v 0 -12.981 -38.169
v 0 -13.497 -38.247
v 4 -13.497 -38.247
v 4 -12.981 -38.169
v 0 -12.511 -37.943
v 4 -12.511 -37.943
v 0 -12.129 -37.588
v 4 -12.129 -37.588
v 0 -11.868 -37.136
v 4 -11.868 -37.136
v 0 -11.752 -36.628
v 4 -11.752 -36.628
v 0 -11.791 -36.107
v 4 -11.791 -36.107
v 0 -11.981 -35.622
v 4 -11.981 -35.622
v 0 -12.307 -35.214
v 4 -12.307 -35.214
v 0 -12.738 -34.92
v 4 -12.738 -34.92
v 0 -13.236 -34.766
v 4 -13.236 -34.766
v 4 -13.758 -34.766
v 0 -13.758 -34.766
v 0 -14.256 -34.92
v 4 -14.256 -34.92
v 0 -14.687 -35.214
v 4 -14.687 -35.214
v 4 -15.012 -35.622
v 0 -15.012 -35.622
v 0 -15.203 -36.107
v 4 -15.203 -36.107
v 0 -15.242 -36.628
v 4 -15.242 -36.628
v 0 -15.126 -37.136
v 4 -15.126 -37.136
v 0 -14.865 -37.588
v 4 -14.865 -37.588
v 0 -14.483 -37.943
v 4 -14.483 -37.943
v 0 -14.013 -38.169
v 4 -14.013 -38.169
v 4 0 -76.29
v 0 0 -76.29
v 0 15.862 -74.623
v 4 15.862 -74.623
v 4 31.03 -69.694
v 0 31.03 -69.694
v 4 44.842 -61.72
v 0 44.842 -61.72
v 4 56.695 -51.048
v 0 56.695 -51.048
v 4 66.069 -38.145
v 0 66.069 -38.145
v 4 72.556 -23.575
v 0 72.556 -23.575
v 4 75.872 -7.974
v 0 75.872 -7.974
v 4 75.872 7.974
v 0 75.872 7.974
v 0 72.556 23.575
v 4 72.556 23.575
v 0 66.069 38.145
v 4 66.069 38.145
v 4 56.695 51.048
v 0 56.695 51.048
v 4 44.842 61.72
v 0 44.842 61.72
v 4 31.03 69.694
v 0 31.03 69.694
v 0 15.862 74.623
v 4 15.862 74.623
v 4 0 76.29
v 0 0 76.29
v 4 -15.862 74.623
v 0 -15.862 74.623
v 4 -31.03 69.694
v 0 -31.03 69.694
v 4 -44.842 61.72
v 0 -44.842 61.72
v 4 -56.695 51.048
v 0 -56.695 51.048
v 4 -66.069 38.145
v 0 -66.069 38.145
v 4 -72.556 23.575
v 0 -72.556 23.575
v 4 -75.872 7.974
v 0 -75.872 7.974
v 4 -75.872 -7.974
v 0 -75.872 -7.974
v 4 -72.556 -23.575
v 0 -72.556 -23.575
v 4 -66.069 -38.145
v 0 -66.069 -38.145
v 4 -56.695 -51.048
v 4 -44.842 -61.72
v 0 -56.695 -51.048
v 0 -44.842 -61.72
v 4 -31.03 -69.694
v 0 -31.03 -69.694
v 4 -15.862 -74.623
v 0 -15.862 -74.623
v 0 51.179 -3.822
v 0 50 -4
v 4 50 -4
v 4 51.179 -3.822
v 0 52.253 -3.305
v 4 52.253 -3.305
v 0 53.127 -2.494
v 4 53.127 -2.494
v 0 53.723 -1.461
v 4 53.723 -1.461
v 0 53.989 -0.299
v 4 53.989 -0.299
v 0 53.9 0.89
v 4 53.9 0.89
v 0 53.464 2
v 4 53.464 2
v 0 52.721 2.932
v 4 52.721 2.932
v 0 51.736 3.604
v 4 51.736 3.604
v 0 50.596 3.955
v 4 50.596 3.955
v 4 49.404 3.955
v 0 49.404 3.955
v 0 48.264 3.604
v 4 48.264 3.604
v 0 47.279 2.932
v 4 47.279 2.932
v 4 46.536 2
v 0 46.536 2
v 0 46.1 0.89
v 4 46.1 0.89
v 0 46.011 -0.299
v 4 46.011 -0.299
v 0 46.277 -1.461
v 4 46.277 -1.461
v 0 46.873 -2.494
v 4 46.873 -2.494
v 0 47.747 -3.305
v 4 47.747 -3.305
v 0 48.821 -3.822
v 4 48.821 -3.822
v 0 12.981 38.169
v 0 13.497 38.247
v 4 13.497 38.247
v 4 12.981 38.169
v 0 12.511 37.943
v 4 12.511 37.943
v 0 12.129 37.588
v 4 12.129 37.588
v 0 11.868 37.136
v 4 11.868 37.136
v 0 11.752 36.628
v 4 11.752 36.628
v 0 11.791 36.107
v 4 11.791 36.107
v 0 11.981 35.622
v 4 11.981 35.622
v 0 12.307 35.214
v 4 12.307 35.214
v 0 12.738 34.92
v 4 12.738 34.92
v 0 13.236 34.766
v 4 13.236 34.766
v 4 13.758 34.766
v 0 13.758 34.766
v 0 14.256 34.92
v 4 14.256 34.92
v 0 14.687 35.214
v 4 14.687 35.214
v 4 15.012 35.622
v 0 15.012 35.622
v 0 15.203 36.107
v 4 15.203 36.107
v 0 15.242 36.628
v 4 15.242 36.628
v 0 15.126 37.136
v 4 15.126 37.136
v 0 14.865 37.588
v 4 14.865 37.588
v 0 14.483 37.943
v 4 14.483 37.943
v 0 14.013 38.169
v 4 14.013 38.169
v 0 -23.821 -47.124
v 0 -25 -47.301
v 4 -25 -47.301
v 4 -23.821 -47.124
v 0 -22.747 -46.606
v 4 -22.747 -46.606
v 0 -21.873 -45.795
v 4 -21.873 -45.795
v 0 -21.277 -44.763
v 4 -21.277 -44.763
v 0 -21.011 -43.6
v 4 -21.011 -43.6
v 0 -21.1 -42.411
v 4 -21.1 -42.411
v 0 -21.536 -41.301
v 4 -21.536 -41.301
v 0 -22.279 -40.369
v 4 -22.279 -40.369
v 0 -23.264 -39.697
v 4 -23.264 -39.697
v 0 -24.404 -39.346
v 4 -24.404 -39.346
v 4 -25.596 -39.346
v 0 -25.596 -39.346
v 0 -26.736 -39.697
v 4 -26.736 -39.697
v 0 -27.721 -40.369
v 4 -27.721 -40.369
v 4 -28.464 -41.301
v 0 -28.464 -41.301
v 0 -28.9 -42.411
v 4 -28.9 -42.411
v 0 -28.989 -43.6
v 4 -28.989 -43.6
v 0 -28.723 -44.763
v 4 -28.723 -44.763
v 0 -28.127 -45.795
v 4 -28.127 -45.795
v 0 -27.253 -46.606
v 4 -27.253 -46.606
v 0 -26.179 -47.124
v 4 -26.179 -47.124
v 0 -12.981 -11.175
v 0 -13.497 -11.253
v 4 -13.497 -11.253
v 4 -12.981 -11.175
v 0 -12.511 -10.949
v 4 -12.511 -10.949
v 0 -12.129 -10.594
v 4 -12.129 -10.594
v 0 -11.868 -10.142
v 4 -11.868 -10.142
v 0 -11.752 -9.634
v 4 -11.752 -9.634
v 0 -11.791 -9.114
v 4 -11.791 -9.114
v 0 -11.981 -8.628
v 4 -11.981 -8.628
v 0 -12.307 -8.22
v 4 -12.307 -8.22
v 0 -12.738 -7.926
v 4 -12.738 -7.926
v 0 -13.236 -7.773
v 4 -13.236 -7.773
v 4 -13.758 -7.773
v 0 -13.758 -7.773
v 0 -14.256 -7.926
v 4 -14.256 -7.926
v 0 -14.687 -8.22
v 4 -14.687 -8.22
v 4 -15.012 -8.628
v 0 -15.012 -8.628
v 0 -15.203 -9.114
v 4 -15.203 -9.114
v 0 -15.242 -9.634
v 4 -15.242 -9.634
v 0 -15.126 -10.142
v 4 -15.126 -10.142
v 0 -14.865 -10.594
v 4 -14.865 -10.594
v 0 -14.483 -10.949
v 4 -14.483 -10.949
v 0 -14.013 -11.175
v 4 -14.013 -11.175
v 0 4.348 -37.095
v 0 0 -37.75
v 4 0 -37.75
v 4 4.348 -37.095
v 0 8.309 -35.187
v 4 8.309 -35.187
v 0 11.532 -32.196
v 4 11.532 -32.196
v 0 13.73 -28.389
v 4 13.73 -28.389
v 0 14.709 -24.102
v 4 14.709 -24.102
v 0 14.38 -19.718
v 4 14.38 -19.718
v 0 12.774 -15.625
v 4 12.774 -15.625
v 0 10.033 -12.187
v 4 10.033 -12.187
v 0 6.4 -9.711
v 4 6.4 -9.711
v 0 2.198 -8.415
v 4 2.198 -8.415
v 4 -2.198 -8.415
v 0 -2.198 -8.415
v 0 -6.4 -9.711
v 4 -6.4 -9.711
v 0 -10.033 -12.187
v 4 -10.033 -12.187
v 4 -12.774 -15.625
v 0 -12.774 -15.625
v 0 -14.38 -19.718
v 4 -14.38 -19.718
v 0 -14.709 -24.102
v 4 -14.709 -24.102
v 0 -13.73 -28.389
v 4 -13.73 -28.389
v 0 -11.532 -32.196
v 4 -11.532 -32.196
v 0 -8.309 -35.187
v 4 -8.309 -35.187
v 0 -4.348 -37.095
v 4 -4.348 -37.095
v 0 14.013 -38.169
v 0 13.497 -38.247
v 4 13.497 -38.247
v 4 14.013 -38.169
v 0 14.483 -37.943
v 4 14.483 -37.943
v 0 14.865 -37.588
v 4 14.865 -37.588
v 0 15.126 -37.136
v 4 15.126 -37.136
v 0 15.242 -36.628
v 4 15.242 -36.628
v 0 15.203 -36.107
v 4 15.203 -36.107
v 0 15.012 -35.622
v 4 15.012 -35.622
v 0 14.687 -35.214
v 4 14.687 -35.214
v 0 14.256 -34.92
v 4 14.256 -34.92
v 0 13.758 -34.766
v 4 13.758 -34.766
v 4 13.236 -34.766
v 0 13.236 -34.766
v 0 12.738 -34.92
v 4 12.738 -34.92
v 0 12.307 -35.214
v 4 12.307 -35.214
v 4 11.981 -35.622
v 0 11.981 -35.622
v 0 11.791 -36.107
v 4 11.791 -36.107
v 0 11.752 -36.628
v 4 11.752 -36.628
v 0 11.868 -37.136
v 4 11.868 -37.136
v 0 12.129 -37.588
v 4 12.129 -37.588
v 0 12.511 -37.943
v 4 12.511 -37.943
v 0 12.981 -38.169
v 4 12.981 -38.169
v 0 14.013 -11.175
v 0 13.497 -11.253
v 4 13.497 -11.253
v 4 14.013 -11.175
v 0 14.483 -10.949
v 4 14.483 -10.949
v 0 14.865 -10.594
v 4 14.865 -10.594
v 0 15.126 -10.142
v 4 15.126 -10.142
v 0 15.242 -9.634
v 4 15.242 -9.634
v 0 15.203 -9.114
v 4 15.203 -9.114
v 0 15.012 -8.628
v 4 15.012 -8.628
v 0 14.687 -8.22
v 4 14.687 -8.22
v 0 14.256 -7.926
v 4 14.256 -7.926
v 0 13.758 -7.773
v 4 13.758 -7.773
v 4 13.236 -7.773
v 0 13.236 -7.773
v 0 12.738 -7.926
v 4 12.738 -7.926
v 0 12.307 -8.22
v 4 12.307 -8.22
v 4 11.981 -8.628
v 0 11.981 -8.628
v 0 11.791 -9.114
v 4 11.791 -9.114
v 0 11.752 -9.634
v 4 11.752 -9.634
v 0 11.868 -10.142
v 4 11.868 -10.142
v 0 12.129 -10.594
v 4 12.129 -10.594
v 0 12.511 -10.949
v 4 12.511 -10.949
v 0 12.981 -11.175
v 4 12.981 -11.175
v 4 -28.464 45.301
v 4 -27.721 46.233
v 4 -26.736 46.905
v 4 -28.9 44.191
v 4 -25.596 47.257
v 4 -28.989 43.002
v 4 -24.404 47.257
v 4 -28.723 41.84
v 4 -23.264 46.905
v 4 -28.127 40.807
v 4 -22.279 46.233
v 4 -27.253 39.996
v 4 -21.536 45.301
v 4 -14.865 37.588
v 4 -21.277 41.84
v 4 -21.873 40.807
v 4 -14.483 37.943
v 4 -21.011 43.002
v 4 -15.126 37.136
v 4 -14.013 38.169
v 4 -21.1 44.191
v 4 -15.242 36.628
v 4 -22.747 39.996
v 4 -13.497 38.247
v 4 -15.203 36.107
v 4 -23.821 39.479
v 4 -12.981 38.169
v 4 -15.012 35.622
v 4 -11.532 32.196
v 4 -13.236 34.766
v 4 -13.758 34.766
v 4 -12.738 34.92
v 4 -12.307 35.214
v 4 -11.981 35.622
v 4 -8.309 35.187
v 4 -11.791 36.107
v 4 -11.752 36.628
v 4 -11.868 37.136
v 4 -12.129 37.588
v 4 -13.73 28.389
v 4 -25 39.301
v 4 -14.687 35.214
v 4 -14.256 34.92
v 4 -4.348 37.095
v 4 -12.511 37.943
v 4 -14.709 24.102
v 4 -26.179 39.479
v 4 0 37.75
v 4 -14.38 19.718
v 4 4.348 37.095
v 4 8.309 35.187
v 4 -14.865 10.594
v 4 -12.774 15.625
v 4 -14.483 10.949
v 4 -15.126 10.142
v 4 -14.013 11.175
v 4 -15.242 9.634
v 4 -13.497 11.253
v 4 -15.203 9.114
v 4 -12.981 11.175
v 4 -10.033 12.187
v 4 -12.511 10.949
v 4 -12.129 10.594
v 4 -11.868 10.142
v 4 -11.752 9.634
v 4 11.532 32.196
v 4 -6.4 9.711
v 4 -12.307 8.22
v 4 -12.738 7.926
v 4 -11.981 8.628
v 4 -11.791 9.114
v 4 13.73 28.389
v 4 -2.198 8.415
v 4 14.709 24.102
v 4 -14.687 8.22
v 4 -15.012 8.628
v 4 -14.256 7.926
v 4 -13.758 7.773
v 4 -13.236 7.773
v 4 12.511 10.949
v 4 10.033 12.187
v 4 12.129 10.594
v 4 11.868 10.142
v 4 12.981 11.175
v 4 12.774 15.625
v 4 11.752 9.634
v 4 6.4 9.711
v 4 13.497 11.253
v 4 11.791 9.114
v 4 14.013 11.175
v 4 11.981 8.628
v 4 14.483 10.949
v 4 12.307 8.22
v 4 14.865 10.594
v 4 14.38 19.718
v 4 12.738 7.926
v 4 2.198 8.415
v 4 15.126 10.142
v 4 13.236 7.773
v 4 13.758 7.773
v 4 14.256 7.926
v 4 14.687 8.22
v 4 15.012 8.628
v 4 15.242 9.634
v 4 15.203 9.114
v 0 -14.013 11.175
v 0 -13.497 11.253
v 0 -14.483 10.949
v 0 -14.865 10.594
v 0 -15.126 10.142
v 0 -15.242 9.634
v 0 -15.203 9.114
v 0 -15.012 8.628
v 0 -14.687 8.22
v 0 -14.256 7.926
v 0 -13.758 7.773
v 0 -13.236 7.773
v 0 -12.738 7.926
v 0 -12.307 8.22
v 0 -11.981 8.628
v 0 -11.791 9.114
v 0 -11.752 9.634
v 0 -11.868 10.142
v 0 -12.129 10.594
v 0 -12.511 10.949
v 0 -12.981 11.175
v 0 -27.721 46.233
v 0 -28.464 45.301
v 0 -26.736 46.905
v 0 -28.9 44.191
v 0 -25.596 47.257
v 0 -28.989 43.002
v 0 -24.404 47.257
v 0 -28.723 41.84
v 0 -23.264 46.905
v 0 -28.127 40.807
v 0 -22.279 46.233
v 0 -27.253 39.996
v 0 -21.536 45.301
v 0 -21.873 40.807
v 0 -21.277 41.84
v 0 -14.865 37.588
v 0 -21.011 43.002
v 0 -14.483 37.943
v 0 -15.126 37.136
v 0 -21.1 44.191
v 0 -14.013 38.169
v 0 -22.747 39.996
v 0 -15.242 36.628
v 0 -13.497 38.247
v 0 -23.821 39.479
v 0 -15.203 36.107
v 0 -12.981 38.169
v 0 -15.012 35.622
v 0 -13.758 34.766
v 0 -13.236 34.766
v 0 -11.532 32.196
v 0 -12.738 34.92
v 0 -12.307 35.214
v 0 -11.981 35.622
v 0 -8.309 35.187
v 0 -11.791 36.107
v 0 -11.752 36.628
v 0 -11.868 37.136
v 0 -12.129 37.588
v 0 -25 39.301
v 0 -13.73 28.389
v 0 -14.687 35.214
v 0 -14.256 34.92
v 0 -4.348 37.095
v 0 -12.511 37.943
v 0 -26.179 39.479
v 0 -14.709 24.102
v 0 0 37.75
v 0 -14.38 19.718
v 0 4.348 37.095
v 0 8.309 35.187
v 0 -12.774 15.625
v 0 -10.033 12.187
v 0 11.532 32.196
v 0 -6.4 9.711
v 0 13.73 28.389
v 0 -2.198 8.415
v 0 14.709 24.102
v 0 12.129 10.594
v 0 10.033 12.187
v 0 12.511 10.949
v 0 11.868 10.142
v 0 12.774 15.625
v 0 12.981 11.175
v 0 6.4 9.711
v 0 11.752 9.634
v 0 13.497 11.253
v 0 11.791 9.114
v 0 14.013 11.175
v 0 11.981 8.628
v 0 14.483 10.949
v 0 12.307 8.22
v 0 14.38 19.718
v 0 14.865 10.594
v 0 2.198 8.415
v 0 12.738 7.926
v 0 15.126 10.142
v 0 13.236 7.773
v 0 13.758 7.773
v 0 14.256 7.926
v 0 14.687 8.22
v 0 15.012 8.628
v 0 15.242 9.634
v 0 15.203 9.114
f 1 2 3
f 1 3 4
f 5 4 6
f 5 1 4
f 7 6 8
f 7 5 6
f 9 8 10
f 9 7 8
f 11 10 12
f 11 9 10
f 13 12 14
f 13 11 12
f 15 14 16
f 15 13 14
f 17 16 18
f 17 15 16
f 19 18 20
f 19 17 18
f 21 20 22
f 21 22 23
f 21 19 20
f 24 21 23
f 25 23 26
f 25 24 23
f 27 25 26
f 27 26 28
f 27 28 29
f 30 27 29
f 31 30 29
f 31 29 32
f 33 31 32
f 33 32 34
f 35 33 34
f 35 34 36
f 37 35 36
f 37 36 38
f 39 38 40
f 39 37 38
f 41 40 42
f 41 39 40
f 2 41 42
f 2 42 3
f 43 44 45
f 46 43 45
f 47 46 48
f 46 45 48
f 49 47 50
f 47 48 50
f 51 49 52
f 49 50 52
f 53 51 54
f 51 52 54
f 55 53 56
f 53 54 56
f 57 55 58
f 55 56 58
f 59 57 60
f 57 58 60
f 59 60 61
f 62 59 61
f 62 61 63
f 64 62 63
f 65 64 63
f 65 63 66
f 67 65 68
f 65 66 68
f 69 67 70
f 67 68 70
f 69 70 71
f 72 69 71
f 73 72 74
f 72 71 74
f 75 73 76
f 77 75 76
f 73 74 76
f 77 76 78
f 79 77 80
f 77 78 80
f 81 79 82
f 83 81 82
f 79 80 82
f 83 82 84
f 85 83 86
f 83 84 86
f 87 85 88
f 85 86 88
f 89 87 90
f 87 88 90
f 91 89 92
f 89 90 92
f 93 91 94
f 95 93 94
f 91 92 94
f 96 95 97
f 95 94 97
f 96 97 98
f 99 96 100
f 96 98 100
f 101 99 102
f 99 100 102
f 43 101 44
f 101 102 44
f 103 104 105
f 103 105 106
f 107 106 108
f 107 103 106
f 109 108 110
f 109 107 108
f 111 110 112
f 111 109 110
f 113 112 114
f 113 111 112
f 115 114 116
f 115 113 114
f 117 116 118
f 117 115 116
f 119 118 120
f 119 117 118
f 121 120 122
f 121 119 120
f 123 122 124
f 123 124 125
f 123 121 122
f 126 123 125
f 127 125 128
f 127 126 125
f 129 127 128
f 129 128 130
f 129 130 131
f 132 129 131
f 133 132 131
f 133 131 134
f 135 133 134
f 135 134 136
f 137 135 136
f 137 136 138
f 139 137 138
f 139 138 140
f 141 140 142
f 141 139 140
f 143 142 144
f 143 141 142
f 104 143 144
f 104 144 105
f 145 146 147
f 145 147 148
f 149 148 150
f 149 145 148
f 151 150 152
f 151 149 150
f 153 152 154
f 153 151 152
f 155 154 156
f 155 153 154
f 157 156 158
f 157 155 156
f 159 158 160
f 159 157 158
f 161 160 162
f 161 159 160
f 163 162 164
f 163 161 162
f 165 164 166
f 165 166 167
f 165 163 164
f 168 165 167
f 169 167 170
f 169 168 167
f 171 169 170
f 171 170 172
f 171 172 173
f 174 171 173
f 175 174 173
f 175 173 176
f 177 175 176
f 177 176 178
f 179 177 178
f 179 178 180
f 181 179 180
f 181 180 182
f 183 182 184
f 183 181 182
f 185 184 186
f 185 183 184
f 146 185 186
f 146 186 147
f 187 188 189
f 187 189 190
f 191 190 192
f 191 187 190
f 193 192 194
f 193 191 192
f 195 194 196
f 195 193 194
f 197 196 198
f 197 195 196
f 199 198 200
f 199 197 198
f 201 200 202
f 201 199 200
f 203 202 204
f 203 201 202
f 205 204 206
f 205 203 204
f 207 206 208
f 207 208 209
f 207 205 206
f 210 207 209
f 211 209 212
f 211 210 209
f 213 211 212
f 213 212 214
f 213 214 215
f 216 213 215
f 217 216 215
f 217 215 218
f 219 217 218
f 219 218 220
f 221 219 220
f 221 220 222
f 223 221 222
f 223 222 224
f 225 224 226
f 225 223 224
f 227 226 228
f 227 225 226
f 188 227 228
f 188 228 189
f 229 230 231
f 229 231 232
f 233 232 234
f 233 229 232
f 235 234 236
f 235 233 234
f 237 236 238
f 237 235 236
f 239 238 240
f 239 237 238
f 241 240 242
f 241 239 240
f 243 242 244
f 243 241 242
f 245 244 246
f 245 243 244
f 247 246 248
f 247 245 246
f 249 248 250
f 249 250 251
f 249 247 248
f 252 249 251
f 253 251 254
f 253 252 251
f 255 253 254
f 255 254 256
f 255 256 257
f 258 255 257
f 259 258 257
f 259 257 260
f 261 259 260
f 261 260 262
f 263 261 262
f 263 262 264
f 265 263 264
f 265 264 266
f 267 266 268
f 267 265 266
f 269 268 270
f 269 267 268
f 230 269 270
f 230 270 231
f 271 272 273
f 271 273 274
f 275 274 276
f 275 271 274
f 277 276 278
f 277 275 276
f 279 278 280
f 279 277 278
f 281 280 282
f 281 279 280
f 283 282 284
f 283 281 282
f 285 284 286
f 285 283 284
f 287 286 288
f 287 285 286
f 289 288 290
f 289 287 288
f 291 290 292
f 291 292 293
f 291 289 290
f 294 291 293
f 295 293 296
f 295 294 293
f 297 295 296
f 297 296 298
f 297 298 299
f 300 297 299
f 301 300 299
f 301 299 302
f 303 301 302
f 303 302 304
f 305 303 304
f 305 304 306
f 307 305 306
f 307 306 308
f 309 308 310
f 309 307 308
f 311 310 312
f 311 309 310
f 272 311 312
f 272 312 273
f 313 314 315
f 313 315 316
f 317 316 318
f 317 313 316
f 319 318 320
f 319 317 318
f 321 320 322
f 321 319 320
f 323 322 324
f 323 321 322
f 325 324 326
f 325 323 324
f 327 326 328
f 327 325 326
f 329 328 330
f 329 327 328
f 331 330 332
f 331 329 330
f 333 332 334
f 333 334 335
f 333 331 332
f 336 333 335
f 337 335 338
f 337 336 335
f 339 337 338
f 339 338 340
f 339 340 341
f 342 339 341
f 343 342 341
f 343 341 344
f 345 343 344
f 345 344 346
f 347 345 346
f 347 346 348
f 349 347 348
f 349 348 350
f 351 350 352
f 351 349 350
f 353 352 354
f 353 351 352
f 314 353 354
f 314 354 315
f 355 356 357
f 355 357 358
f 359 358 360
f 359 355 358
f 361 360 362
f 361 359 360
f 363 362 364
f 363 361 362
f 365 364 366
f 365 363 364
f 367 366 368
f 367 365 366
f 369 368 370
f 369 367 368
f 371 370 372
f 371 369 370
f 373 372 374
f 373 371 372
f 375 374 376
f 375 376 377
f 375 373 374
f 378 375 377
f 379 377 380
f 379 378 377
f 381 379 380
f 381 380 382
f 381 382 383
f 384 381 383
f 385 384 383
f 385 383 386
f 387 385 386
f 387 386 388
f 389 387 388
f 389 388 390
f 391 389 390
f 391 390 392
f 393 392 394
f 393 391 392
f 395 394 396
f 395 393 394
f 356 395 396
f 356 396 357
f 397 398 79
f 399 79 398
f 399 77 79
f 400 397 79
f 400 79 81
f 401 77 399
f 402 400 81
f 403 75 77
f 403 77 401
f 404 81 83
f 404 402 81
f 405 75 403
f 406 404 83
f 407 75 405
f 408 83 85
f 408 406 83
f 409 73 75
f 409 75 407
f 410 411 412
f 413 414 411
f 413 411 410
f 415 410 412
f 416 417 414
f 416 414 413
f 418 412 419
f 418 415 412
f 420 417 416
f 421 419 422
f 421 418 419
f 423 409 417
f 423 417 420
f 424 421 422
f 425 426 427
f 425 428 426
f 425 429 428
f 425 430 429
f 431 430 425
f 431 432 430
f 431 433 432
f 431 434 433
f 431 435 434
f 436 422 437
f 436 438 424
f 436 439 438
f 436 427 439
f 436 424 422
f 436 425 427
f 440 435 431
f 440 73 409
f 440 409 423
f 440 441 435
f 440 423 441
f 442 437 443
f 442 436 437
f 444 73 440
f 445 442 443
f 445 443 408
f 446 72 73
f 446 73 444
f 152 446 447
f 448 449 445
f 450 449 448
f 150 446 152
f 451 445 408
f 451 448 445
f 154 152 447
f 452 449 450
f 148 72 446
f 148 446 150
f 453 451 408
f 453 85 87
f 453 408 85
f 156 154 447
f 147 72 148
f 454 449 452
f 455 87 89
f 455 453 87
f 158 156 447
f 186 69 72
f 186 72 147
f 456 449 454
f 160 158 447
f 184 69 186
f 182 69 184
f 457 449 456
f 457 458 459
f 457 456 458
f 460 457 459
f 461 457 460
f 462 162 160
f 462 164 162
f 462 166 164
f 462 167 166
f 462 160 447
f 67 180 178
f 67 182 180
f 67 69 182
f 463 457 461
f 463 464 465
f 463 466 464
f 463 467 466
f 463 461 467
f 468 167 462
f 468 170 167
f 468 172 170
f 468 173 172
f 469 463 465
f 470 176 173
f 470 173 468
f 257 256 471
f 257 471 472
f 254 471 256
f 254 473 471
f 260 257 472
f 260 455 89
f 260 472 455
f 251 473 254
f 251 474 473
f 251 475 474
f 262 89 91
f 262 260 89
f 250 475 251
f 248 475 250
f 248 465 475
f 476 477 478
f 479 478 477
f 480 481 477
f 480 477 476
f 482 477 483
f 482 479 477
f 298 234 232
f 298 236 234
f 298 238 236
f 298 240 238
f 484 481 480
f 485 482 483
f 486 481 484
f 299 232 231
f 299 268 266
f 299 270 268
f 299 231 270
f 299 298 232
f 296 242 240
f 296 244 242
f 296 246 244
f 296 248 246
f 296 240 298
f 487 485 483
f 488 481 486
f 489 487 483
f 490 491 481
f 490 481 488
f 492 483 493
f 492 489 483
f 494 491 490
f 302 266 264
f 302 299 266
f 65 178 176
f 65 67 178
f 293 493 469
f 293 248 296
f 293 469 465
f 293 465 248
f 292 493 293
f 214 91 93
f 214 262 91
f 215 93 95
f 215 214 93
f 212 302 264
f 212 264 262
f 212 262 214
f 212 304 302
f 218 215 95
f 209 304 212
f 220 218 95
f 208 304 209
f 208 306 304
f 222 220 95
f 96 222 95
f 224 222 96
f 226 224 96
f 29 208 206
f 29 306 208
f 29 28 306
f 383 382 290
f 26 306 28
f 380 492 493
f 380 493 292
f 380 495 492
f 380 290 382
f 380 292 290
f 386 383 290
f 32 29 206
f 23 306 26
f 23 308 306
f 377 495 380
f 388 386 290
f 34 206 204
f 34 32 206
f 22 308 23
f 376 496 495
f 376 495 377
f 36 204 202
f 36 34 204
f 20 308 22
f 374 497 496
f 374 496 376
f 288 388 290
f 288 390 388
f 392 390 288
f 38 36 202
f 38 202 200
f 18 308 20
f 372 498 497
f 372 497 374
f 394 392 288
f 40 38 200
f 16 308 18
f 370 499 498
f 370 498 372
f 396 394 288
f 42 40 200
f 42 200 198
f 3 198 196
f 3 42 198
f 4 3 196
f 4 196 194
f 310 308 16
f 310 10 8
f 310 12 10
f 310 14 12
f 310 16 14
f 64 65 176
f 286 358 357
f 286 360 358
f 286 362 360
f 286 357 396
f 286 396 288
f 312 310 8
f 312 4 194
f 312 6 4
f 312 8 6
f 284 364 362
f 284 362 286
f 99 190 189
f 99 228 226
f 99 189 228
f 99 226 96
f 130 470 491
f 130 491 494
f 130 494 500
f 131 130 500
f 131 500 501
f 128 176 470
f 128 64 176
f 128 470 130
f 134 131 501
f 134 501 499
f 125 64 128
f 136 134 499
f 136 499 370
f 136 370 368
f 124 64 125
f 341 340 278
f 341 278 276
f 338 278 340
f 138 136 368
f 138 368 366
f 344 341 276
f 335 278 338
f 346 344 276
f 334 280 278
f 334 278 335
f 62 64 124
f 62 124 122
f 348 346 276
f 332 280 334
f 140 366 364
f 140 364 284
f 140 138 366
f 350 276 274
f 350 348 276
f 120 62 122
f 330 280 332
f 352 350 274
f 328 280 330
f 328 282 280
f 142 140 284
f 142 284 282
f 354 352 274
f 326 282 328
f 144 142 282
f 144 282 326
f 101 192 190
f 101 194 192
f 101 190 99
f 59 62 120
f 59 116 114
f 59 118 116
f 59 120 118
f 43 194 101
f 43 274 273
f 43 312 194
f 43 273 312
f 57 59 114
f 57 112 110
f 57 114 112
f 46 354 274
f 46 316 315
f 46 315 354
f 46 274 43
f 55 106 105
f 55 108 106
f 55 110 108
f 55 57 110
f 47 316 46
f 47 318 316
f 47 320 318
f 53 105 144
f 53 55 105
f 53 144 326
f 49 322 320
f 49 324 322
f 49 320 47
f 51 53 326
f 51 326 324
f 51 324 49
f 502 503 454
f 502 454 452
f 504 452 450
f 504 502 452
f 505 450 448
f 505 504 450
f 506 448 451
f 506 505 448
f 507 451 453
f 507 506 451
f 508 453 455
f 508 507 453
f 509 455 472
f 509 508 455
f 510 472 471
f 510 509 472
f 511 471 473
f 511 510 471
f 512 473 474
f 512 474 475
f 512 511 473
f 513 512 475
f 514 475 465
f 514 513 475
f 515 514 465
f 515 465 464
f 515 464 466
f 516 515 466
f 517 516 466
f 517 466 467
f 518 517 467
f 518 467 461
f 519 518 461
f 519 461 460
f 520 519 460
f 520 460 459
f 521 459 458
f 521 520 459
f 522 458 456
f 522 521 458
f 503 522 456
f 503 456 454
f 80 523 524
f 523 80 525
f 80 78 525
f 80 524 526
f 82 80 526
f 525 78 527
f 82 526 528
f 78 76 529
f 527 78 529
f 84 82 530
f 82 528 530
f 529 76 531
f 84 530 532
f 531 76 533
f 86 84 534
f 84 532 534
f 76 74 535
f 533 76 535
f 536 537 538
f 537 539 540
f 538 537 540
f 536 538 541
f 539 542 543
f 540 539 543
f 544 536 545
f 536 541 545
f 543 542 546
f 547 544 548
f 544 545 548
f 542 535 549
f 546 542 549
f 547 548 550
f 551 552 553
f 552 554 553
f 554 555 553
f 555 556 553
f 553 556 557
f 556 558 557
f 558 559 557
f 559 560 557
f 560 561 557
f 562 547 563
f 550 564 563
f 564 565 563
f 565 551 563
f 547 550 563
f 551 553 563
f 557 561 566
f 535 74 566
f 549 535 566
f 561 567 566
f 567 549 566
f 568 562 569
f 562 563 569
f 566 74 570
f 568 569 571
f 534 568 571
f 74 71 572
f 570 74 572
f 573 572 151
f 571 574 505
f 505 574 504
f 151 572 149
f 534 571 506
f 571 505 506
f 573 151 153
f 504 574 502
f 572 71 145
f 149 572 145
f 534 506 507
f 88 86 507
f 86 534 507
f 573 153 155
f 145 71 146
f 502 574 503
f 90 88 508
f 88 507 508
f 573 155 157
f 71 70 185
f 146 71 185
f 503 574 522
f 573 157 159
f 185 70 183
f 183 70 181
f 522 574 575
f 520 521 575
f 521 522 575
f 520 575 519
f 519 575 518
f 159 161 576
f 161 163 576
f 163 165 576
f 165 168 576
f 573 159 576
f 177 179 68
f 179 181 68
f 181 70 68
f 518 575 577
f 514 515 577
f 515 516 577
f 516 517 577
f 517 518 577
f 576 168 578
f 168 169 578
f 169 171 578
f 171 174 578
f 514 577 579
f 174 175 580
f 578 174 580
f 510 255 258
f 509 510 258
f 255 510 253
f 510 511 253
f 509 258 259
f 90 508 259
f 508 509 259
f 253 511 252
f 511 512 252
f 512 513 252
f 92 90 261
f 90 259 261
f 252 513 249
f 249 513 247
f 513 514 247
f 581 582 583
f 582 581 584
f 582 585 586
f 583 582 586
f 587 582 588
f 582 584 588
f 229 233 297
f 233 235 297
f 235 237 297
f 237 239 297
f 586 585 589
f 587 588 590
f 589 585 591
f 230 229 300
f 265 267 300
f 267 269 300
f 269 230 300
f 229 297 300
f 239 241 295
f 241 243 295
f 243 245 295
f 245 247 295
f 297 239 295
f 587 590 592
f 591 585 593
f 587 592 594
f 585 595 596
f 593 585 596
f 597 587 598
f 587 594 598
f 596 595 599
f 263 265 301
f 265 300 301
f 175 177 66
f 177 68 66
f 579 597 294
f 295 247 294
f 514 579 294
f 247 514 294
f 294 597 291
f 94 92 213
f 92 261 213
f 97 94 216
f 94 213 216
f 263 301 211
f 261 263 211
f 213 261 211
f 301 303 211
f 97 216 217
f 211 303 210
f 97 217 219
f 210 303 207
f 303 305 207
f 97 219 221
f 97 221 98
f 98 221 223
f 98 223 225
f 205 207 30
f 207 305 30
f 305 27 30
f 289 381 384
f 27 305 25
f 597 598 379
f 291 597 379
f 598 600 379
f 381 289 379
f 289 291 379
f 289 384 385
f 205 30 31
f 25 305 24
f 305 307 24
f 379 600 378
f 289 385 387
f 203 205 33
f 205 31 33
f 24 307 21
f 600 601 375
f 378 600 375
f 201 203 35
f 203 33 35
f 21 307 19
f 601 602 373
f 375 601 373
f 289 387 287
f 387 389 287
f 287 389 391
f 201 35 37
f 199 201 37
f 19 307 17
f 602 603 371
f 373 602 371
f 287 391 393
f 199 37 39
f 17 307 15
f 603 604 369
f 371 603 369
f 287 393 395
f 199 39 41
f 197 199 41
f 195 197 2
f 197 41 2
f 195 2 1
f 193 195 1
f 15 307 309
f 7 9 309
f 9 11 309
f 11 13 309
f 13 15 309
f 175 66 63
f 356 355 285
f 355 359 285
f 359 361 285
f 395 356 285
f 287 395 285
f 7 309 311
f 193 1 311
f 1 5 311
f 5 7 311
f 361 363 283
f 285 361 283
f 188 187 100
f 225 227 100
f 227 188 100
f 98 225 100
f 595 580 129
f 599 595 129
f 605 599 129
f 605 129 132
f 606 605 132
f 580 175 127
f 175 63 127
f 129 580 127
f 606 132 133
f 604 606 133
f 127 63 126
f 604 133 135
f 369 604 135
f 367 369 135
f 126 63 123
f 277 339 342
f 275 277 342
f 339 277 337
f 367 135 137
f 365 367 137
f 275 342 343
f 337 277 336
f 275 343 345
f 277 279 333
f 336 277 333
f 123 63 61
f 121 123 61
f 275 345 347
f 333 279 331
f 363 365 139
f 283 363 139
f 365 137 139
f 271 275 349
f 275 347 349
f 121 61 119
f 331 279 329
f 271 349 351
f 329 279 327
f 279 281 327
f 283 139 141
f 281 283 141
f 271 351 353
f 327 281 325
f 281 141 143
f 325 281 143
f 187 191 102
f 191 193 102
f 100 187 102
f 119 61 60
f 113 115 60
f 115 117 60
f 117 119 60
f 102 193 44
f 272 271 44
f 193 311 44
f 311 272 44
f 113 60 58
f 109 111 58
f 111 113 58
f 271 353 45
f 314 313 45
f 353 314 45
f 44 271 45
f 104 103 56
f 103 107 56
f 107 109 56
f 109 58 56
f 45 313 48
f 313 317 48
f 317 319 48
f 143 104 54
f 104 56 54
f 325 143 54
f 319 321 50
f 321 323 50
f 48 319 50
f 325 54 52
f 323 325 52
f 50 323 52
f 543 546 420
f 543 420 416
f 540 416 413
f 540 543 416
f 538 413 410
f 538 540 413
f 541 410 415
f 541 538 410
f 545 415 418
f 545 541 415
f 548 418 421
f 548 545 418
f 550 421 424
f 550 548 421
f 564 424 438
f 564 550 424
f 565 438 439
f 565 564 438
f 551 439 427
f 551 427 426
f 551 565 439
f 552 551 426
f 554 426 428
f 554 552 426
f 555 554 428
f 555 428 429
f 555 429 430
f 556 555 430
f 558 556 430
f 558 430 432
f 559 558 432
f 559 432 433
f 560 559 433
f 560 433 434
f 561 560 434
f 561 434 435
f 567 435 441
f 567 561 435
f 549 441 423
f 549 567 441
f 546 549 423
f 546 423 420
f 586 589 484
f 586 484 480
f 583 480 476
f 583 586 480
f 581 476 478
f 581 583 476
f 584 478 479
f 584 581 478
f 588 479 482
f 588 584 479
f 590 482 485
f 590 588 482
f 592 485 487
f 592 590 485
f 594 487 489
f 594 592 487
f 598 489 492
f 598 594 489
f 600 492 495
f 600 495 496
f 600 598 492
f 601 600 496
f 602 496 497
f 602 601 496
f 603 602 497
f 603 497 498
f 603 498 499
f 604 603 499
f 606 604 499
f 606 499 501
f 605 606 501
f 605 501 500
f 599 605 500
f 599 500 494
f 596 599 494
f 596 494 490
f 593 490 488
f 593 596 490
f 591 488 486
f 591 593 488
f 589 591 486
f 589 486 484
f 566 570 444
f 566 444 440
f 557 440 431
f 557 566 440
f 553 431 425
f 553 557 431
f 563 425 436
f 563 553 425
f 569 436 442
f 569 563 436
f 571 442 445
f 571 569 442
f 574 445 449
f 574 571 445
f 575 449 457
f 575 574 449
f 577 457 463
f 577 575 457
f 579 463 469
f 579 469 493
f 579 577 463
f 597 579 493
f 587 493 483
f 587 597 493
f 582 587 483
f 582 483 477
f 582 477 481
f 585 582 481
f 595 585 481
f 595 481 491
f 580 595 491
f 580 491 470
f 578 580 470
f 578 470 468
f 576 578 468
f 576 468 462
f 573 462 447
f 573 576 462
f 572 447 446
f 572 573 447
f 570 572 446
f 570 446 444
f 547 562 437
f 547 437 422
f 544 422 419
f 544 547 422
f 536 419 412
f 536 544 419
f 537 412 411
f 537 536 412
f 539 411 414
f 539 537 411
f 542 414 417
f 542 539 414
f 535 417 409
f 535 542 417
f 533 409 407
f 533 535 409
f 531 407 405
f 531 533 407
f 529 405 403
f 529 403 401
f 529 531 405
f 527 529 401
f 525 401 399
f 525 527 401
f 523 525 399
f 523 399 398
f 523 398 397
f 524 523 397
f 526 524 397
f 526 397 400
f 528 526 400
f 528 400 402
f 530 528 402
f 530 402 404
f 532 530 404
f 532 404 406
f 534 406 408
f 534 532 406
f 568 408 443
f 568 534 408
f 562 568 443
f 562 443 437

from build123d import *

# Parameters (mm, degrees)
SKETCH1_R           = 76.29
SKETCH1_R_2         = 4
SKETCH1_R_3         = 14.75
SKETCH1_R_4         = 1.75
BOSS_EXTRUDE1_DEPTH = 4


with BuildPart() as part:
    # Sketch1 → Boss-Extrude1 (new body)
    with BuildSketch(Plane(origin=(0, 0, 0), x_dir=(0, 0, -1), z_dir=(1, 0, 0))):
        Circle(SKETCH1_R)
        with Locations((0, 50)):
            Circle(SKETCH1_R_2, mode=Mode.SUBTRACT)
        with Locations((43.301270189, -25)):
            Circle(SKETCH1_R_2, mode=Mode.SUBTRACT)
        with Locations((-43.301270189, -25)):
            Circle(SKETCH1_R_2, mode=Mode.SUBTRACT)
        with Locations((23, 0)):
            Circle(SKETCH1_R_3, mode=Mode.SUBTRACT)
        with Locations(Location((-23, 0, 0), (0, 0, 180))):
            Circle(SKETCH1_R_3, mode=Mode.SUBTRACT)
        with Locations((36.496900686, 13.496900686)):
            Circle(SKETCH1_R_4, mode=Mode.SUBTRACT)
        with Locations((36.496900686, -13.496900686)):
            Circle(SKETCH1_R_4, mode=Mode.SUBTRACT)
        with Locations((9.503099314, -13.496900686)):
            Circle(SKETCH1_R_4, mode=Mode.SUBTRACT)
        with Locations((9.503099314, 13.496900686)):
            Circle(SKETCH1_R_4, mode=Mode.SUBTRACT)
        with Locations(Location((-36.496900686, -13.496900686, 0), (0, 0, 180))):
            Circle(SKETCH1_R_4, mode=Mode.SUBTRACT)
        with Locations(Location((-9.503099314, -13.496900686, 0), (0, 0, 180))):
            Circle(SKETCH1_R_4, mode=Mode.SUBTRACT)
        with Locations(Location((-9.503099314, 13.496900686, 0), (0, 0, 180))):
            Circle(SKETCH1_R_4, mode=Mode.SUBTRACT)
        with Locations(Location((-36.496900686, 13.496900686, 0), (0, 0, 180))):
            Circle(SKETCH1_R_4, mode=Mode.SUBTRACT)
    extrude(amount=BOSS_EXTRUDE1_DEPTH)


solid = part.part
